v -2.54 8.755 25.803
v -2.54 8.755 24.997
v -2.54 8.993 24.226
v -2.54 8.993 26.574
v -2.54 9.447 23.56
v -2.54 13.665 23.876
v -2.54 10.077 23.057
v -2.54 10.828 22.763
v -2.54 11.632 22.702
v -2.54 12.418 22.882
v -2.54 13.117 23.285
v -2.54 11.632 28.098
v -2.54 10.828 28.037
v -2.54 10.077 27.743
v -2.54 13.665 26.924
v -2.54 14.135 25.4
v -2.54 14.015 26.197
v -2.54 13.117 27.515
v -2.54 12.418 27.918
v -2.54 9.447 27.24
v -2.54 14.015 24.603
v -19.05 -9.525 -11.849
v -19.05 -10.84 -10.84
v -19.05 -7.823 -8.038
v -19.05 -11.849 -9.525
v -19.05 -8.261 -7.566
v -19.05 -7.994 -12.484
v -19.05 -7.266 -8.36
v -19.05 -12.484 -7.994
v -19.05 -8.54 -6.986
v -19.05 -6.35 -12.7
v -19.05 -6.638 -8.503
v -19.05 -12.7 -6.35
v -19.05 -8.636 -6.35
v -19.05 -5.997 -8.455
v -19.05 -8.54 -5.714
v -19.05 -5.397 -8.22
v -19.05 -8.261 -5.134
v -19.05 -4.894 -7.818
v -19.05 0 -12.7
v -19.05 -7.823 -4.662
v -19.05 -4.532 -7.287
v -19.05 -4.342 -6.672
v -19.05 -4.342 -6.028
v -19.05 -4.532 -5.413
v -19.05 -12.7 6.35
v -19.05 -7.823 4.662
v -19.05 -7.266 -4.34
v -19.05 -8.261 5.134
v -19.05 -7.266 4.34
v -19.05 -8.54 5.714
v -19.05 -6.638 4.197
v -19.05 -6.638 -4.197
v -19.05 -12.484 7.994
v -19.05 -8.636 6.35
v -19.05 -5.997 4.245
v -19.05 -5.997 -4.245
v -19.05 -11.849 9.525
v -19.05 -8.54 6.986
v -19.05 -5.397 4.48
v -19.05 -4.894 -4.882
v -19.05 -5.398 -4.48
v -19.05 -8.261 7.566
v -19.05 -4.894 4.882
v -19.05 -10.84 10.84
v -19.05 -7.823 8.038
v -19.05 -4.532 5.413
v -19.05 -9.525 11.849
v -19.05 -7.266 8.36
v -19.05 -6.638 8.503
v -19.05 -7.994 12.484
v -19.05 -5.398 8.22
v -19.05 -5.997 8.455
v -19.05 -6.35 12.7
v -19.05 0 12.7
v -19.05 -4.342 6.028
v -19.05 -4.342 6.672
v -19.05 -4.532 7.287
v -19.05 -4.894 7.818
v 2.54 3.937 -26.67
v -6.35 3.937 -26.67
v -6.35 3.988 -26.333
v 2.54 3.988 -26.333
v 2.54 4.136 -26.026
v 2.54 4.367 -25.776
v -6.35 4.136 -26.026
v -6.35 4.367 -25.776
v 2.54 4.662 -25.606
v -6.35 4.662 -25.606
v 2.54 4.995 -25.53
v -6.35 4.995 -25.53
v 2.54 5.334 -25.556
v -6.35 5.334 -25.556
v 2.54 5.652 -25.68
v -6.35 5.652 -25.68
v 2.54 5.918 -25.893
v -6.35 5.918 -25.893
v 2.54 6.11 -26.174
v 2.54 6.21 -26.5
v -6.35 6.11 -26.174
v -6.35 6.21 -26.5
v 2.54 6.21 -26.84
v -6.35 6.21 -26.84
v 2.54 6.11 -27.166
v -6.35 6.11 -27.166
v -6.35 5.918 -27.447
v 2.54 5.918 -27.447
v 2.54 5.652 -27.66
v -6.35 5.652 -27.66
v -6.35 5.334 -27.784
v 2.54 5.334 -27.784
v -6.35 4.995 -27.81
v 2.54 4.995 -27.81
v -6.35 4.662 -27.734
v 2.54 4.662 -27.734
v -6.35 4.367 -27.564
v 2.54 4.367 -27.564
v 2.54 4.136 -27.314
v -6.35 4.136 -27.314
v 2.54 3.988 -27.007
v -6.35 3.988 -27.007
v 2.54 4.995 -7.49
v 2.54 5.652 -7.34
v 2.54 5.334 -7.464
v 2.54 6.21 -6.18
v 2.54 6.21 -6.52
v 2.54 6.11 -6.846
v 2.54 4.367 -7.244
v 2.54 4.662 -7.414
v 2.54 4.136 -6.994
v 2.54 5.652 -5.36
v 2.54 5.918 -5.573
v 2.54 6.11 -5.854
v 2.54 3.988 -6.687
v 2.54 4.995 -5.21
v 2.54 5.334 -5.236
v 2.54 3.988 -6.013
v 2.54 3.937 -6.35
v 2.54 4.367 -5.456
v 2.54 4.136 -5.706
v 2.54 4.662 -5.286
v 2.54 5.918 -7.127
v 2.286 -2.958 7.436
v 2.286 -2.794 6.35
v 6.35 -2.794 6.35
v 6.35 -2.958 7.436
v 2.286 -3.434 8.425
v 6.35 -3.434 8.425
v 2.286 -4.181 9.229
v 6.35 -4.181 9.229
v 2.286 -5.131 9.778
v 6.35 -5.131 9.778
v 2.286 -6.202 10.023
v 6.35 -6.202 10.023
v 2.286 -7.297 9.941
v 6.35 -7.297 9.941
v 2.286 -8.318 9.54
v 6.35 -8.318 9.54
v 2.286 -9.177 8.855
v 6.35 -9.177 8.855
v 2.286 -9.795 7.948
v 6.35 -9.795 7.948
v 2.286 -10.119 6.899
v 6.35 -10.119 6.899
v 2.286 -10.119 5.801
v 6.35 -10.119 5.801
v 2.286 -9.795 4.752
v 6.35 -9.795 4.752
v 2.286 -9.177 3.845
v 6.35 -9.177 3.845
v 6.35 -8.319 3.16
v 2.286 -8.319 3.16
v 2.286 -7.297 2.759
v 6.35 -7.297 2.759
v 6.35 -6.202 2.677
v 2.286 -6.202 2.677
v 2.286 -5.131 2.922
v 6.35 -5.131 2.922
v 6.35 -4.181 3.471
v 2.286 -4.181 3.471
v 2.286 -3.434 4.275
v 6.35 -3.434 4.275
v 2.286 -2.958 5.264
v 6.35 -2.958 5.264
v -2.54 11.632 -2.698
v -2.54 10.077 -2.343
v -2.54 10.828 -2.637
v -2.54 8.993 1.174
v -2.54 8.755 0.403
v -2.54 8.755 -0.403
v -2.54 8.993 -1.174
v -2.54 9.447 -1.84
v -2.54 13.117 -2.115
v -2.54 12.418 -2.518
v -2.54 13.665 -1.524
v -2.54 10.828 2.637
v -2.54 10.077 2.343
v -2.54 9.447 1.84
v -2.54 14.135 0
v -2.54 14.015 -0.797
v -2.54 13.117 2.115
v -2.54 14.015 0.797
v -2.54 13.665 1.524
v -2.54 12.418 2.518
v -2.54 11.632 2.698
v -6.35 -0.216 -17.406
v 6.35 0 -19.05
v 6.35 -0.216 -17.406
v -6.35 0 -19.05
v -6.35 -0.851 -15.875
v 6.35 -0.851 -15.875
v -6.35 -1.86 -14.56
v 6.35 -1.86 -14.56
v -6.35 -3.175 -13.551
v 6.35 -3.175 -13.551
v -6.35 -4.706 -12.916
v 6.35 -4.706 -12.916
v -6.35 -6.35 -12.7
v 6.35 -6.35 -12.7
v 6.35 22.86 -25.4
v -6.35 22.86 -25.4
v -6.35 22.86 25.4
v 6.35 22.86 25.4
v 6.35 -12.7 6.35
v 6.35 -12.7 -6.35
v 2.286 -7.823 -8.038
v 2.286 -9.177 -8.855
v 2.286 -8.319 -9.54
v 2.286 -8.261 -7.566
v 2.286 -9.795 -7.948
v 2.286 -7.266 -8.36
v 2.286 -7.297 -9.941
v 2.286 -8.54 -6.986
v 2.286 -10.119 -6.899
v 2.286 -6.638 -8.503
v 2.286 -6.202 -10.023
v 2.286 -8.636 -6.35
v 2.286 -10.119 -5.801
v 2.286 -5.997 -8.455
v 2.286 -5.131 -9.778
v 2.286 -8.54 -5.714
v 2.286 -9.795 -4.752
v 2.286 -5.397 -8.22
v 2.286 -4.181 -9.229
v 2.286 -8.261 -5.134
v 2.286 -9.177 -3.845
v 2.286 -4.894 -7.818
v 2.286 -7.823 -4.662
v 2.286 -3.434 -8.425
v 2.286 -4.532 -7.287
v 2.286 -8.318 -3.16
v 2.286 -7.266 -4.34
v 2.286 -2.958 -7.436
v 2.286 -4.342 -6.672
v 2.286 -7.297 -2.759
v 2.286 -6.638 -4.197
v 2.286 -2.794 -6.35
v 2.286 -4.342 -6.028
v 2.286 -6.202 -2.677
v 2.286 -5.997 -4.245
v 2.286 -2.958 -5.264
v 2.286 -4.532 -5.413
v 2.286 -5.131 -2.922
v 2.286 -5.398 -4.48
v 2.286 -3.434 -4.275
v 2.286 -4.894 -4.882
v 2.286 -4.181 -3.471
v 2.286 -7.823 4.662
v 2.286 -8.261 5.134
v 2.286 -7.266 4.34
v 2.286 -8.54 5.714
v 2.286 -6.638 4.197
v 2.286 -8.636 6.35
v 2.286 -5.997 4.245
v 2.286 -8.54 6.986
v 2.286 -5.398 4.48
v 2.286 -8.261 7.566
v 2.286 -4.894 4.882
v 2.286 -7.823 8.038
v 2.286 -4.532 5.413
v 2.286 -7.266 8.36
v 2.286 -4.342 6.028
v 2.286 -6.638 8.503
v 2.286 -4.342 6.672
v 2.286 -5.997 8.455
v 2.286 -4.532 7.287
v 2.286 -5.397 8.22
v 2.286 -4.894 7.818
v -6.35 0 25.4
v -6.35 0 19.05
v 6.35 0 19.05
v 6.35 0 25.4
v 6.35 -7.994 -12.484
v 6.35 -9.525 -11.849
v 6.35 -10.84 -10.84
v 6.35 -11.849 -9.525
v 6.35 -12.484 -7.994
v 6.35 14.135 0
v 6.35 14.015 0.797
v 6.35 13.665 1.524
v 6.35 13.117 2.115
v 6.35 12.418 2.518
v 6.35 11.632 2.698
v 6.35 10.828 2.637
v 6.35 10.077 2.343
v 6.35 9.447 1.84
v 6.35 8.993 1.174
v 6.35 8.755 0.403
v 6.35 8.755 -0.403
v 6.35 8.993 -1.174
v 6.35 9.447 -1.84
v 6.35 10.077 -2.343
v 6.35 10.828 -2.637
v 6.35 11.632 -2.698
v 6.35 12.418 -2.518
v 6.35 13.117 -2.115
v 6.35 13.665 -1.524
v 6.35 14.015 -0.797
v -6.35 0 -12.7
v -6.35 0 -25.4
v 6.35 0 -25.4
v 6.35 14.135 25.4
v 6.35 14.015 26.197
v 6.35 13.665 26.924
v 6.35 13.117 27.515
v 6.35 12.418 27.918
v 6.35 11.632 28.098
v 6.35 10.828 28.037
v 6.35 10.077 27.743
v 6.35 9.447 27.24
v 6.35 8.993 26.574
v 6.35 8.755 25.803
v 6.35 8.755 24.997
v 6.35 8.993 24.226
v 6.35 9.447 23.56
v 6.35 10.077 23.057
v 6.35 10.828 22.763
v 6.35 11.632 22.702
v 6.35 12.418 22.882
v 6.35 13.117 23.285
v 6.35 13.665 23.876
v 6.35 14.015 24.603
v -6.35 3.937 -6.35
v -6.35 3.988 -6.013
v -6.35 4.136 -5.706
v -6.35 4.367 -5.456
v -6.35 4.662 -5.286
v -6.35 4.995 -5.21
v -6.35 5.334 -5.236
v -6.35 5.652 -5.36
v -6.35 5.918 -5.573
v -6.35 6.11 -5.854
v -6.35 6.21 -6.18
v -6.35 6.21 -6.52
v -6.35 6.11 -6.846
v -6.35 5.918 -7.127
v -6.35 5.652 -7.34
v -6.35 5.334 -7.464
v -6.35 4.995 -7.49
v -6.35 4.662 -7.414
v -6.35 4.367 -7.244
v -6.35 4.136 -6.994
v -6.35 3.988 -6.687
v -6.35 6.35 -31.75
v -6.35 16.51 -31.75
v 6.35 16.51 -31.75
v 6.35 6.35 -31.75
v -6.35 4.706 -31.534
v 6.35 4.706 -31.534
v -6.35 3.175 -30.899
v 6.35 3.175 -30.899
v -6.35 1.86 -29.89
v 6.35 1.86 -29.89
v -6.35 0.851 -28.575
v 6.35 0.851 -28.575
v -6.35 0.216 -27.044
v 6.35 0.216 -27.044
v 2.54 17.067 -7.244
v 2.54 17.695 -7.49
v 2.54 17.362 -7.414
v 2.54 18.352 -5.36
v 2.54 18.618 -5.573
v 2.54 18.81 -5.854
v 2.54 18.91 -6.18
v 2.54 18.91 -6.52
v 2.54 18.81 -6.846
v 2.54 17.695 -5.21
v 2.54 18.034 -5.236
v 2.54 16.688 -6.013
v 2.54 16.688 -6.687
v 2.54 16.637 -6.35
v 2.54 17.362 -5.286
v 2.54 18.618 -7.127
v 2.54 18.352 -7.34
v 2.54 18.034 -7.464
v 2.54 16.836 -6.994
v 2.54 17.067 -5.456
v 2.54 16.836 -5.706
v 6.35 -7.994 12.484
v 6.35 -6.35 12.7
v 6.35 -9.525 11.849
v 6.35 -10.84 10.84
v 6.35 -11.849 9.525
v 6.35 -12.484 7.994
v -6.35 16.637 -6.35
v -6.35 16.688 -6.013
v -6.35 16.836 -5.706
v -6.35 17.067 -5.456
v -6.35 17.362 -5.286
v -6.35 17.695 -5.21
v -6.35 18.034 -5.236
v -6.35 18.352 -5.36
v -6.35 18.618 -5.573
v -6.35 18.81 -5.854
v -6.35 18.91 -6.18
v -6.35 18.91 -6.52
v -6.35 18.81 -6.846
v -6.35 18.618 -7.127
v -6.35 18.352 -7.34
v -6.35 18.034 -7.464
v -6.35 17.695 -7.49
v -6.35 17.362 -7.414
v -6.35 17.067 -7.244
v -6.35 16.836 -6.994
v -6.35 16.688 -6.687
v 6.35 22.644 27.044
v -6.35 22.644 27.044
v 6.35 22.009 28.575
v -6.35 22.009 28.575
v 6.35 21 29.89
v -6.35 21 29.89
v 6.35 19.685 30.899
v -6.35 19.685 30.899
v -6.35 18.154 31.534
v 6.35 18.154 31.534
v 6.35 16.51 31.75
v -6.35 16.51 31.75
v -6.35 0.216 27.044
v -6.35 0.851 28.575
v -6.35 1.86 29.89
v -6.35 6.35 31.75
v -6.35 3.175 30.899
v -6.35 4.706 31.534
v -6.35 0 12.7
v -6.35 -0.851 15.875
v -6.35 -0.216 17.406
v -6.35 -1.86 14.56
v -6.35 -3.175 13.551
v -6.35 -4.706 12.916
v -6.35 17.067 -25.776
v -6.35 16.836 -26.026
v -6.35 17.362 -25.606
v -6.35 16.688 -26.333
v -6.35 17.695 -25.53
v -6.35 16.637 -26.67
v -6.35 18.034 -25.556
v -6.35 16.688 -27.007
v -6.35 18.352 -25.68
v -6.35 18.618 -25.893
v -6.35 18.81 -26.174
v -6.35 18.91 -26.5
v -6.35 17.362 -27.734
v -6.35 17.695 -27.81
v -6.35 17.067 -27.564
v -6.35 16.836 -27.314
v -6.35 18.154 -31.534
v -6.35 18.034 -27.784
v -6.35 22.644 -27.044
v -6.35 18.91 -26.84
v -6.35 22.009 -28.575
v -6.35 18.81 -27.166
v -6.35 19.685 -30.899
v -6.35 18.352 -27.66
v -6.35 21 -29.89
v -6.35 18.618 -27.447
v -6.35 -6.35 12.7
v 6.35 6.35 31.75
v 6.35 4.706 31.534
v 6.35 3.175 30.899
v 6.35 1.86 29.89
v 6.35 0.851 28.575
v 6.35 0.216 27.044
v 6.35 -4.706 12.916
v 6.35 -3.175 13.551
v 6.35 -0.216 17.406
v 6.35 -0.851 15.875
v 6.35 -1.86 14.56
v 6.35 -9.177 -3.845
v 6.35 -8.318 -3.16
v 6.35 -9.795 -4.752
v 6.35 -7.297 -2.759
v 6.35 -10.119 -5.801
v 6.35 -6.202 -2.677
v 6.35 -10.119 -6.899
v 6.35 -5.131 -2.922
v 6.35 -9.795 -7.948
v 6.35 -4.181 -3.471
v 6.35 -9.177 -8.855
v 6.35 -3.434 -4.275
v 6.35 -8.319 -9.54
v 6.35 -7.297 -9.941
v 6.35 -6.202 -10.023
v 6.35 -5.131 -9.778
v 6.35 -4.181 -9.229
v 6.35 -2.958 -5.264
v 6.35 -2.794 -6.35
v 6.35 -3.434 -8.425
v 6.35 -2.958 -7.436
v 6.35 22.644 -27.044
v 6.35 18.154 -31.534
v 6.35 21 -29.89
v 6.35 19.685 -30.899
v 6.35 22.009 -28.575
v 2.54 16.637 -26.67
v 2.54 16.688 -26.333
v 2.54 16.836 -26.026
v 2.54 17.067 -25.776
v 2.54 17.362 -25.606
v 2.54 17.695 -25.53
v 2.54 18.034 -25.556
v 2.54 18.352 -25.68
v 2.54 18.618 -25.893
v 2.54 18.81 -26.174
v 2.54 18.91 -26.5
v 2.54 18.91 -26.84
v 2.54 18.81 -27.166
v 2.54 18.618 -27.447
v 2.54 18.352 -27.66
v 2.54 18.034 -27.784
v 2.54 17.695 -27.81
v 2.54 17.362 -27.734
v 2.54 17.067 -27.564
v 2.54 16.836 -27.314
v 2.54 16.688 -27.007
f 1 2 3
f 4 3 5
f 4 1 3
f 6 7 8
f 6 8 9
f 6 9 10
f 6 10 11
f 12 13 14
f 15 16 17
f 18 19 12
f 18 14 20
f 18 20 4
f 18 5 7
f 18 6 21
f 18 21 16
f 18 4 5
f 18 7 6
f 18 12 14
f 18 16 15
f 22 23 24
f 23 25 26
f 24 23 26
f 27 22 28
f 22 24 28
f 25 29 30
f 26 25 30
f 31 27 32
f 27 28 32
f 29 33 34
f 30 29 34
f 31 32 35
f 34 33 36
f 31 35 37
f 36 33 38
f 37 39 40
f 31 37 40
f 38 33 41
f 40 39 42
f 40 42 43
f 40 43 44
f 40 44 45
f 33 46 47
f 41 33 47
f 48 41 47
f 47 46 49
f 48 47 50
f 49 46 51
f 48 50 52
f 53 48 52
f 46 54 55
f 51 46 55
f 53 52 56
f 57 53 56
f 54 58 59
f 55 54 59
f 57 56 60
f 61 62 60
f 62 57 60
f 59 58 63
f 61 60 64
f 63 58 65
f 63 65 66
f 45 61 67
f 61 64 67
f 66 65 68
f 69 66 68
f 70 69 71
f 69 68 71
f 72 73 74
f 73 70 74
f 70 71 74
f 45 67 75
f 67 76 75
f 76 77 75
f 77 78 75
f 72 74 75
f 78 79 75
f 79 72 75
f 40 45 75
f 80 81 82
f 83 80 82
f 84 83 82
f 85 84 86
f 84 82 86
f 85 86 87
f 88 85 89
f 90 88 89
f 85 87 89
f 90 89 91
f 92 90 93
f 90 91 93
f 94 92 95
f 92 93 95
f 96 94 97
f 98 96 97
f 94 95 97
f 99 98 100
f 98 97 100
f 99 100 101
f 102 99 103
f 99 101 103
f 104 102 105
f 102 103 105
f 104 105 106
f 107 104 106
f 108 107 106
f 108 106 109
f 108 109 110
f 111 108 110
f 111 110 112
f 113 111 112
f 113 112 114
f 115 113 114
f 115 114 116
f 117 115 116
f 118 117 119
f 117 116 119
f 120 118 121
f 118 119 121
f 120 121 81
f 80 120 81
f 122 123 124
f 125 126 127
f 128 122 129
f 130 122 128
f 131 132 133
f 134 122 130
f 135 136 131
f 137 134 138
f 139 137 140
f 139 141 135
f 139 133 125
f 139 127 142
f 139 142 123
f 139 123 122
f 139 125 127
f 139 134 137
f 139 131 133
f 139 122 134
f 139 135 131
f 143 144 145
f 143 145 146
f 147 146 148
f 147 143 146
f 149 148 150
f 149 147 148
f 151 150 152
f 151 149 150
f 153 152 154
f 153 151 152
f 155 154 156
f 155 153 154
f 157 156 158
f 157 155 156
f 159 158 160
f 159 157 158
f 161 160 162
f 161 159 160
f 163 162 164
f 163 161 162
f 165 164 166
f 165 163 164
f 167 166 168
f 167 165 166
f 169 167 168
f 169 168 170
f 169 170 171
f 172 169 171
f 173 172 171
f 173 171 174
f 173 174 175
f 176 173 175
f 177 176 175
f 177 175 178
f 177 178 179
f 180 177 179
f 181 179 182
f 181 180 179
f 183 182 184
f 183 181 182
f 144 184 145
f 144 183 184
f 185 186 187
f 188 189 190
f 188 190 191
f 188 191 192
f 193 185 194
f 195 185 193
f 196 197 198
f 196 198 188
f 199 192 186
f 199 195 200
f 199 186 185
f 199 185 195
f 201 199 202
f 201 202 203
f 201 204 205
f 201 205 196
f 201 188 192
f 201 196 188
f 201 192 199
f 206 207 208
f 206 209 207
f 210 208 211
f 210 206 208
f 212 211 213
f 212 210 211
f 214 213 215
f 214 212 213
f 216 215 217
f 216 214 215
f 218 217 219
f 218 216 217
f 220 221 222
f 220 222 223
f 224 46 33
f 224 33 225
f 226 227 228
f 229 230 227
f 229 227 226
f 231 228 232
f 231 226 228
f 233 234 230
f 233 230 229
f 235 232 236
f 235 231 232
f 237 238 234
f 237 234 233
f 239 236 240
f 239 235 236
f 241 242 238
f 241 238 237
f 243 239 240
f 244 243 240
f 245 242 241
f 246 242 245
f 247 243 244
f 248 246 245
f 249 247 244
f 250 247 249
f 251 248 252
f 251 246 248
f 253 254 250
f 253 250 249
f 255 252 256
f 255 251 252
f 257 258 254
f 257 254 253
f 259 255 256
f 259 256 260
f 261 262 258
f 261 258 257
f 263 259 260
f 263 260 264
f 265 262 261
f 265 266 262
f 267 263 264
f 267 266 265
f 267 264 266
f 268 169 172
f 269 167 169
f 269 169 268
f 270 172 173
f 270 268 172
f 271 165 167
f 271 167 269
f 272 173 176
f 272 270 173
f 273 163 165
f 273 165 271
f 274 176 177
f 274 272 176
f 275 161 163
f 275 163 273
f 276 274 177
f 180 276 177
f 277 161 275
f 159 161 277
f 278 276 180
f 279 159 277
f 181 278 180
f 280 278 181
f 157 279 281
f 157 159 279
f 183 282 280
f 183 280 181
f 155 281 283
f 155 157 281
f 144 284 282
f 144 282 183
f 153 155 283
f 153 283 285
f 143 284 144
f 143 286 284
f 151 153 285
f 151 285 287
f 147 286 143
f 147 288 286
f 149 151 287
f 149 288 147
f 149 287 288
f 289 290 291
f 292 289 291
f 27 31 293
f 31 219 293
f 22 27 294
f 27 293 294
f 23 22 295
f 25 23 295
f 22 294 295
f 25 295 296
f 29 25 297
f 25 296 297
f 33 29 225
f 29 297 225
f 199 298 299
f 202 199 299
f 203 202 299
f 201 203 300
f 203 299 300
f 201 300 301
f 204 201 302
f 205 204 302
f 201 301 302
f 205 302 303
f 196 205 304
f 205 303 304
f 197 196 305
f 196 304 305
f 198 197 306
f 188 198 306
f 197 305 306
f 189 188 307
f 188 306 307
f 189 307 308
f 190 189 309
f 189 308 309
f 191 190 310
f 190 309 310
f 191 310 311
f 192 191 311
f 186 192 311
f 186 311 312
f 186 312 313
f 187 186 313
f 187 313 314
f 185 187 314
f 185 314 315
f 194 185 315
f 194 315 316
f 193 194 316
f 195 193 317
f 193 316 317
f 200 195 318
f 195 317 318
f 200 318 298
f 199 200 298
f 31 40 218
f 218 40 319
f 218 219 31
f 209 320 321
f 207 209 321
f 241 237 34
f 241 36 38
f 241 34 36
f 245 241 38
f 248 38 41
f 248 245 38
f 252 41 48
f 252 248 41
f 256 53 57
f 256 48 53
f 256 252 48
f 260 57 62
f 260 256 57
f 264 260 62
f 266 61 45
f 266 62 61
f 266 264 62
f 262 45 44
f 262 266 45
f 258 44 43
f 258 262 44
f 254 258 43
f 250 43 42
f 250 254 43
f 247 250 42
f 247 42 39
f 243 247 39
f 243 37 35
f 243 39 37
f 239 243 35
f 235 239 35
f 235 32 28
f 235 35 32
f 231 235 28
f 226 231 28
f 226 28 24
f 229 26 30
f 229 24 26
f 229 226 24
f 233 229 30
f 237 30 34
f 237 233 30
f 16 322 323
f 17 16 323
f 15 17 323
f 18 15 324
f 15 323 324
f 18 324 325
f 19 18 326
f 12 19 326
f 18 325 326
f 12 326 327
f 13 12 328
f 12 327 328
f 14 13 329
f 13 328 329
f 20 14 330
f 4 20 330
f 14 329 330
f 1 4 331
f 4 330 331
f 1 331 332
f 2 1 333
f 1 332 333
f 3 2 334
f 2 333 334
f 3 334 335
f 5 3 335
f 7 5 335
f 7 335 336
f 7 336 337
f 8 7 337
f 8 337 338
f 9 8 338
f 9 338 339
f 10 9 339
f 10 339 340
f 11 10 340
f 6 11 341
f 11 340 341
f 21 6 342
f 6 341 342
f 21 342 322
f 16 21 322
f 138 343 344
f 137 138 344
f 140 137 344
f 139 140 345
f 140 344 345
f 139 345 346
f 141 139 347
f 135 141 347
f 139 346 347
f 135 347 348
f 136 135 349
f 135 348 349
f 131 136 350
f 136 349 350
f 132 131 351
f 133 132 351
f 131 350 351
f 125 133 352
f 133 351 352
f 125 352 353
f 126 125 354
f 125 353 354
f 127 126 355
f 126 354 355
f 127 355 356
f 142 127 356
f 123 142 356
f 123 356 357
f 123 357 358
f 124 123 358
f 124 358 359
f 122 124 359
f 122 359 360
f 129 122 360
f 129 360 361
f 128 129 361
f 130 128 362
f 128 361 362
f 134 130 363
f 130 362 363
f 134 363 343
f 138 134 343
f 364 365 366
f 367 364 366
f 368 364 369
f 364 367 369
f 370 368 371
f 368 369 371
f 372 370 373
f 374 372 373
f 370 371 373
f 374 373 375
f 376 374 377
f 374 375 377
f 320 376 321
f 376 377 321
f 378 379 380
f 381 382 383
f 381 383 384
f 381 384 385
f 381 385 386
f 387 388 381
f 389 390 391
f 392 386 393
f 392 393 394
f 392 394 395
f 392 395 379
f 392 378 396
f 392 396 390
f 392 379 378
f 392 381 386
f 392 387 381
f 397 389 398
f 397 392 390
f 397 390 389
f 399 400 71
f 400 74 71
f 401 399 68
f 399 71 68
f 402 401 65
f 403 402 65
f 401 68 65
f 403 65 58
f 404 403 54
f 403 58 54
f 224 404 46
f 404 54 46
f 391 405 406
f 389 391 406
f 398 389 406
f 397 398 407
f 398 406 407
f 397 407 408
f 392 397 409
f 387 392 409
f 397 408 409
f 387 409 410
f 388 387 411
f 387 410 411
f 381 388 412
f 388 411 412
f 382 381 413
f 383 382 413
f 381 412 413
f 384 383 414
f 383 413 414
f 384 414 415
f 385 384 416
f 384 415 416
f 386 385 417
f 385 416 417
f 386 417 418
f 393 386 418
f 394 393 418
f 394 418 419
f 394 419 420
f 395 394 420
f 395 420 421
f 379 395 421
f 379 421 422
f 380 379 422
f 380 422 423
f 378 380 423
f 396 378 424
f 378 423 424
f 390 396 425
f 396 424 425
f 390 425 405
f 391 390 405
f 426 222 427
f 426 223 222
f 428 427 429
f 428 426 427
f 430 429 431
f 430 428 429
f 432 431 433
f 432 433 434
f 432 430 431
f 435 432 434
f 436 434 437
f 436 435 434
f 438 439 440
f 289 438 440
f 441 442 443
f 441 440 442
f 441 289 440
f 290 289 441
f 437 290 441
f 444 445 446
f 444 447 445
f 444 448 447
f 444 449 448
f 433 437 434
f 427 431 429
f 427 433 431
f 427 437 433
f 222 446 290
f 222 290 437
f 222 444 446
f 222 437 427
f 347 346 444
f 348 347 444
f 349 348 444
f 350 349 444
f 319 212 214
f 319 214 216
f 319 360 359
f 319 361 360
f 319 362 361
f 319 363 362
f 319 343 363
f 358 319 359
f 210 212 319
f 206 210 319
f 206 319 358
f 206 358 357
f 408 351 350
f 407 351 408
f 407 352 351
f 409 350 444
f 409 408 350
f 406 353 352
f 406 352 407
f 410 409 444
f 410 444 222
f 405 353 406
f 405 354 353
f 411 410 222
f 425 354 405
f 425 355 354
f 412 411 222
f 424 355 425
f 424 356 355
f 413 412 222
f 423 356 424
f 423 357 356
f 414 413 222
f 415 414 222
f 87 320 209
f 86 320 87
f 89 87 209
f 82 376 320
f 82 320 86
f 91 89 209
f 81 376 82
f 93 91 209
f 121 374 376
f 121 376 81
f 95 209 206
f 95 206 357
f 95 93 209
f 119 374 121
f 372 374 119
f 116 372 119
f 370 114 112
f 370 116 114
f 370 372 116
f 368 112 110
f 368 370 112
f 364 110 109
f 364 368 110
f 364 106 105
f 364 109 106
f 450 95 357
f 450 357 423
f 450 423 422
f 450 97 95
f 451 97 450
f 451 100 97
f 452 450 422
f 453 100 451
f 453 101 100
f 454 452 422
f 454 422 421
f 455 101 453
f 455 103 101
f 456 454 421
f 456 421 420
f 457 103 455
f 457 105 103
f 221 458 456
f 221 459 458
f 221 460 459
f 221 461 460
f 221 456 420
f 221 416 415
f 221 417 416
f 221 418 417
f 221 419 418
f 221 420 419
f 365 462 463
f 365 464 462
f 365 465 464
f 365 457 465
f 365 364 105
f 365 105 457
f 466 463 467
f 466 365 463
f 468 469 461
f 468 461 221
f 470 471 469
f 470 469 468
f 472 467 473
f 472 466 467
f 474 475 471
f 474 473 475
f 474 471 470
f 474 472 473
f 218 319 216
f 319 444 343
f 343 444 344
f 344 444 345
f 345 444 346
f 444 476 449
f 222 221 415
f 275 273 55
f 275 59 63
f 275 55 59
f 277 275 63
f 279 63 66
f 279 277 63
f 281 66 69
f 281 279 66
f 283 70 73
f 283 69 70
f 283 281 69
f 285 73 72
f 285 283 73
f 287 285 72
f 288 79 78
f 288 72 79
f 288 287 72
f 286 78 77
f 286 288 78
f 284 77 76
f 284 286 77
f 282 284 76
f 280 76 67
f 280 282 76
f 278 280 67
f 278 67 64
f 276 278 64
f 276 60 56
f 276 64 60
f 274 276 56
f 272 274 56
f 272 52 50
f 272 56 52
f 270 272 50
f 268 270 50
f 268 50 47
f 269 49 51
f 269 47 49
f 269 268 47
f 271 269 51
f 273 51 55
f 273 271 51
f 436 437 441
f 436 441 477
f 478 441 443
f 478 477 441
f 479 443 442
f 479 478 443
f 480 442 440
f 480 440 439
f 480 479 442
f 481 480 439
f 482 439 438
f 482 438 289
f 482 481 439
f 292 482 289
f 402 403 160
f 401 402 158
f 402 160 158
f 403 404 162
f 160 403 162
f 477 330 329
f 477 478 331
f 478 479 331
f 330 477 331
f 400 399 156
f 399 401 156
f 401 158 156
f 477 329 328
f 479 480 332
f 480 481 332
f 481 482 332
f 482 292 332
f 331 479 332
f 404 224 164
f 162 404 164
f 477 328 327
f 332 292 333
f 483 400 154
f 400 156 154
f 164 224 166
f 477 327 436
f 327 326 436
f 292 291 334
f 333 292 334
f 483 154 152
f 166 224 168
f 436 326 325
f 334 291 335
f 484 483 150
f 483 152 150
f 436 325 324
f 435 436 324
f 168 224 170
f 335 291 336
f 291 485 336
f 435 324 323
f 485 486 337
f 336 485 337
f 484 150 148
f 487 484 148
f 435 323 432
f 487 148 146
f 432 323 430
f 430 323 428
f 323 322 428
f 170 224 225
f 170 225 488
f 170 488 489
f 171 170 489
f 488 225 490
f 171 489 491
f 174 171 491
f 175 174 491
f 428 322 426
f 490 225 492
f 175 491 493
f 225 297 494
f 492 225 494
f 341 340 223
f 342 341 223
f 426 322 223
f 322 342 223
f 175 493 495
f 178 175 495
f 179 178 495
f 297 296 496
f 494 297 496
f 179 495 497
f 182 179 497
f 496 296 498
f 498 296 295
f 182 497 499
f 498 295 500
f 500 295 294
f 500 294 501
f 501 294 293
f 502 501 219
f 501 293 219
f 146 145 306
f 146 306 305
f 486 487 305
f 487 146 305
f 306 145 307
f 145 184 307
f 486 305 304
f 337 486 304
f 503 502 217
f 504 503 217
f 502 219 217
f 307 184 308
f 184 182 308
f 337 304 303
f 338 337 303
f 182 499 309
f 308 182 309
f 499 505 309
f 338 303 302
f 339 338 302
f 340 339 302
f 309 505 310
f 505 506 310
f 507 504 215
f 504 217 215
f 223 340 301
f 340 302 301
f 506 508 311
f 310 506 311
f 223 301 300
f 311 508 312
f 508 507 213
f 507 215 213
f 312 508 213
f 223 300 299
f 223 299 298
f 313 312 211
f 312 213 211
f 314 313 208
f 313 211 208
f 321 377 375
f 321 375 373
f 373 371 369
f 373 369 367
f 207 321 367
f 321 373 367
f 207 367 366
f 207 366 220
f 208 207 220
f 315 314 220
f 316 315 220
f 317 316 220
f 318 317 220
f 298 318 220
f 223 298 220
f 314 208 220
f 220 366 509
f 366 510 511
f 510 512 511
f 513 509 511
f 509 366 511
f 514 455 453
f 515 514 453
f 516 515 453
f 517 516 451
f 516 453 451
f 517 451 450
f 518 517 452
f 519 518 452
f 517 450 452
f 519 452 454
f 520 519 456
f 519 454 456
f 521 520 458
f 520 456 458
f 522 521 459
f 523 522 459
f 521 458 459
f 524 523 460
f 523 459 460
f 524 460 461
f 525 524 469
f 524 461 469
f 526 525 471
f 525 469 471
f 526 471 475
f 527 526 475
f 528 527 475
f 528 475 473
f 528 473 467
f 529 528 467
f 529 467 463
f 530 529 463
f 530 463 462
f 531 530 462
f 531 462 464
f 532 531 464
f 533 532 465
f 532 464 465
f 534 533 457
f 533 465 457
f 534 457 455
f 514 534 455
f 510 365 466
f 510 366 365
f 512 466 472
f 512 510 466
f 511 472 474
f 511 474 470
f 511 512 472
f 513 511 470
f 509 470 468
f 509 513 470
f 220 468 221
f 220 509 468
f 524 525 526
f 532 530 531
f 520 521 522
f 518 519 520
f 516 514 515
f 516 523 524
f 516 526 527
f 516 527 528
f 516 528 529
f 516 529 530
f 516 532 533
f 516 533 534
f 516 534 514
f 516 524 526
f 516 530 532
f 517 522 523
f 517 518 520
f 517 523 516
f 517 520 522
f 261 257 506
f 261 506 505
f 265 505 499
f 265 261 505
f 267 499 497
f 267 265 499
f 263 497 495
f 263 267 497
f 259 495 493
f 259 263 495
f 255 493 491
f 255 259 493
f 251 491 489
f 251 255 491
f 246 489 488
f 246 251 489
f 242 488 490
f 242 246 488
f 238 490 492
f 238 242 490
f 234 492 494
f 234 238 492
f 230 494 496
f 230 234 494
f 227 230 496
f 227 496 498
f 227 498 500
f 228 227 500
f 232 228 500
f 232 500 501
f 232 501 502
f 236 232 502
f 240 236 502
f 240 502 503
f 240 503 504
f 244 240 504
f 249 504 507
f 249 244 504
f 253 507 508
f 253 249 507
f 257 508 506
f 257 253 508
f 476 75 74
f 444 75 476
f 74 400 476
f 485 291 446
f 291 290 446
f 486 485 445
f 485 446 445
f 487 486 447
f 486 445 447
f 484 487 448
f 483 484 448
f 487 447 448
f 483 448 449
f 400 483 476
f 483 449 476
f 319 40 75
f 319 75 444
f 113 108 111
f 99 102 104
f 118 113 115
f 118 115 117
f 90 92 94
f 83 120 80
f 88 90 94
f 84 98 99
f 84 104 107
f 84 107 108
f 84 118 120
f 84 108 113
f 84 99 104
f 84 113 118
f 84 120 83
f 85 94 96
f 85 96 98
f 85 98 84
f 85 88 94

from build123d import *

# Parameters (mm, degrees)
PROFILE_W                = 12.7
PROFILE_H                = 22.86
PROFILE_W_2              = 6.35
PROFILE_H_2              = 12.7
BOSS_EXTRUDE1_DEPTH      = 12.7
SKETCH7_W                = 19.05
SKETCH7_H                = 12.7
BOSS_EXTRUDE2_DEPTH      = 25.4
CUT_EXTRUDE1_DEPTH       = 37.45585824
CUT_EXTRUDE1_DEPTH_BACK  = 37.45585824
SCREWHOLE_R              = 2.159
CUT_EXTRUDE2_START       = -4.064
SKETCH3_R                = 3.683
SKETCH3_R_2              = 2.159
CUT_EXTRUDE2_DEPTH       = 4.064
BOSS_EXTRUDE4_DEPTH      = 31.75
BOSS_EXTRUDE4_DEPTH_BACK = 31.75
SKETCH11_W               = 12.7
SKETCH11_H               = 22.86
SKETCH14_R               = 2.7051
CUT_EXTRUDE3_DEPTH       = 8.89
SKETCH13_R               = 1.143
CUT_EXTRUDE4_DEPTH       = 8.89
FILLET1_R                = 6.35


with BuildPart() as part:
    # Profile → Boss-Extrude1 (new, symmetric)
    with BuildSketch(Plane.XY):
        with Locations((0, 11.43)):
            Rectangle(PROFILE_W, PROFILE_H)
        with Locations((3.175, -6.35)):
            Rectangle(PROFILE_W_2, PROFILE_H_2)
    extrude(amount=BOSS_EXTRUDE1_DEPTH, both=True)

    # Sketch7 → Boss-Extrude2 (add)
    with BuildSketch(Plane.XY.offset(12.7)):
        with Locations((-9.525, -6.35)):
            Rectangle(SKETCH7_W, SKETCH7_H)
    extrude(amount=-BOSS_EXTRUDE2_DEPTH)

    # ScrewHole → Cut-Extrude1 (cut, two sides: drawn at the far end of the back side and taken through both)
    with BuildSketch(Plane.ZY.offset(19.05).offset(-CUT_EXTRUDE1_DEPTH_BACK)):
        with Locations(Location((6.35, -6.477, 0), (0, 0, 270))):
            Circle(SCREWHOLE_R)
        with Locations(Location((-6.35, -6.477, 0), (0, 0, 270))):
            Circle(SCREWHOLE_R)
    extrude(amount=CUT_EXTRUDE1_DEPTH + CUT_EXTRUDE1_DEPTH_BACK, mode=Mode.SUBTRACT)

    # Sketch3 → Cut-Extrude2 (cut)
    # profile 1 of 2: a face of its own
    with BuildSketch(Plane(origin=(6.35, 0, 0), x_dir=(0, 0, -1), z_dir=(1, 0, 0)).offset(CUT_EXTRUDE2_START)):
        with Locations(Location((-6.35, -6.477, 0), (0, 0, 90))):
            Circle(SKETCH3_R)
        with Locations(Location((-6.35, -6.477, 0), (0, 0, 270))):
            Circle(SKETCH3_R_2, mode=Mode.SUBTRACT)
    # profile 2 of 2: a face of its own
    with BuildSketch(Plane(origin=(6.35, 0, 0), x_dir=(0, 0, -1), z_dir=(1, 0, 0)).offset(CUT_EXTRUDE2_START)):
        with Locations(Location((6.35, -6.477, 0), (0, 0, 90))):
            Circle(SKETCH3_R)
    extrude(amount=CUT_EXTRUDE2_DEPTH, mode=Mode.SUBTRACT)

    # Sketch11 → Boss-Extrude4 (add, two sides: drawn at the far end of the back side and taken through both)
    with BuildSketch(Plane.XY.offset(-BOSS_EXTRUDE4_DEPTH_BACK)):
        with Locations((0, 11.43)):
            Rectangle(SKETCH11_W, SKETCH11_H)
    extrude(amount=BOSS_EXTRUDE4_DEPTH + BOSS_EXTRUDE4_DEPTH_BACK)

    # Sketch14 → Cut-Extrude3 (cut)
    with BuildSketch(Plane(origin=(6.35, 0, 0), x_dir=(0, 0, -1), z_dir=(1, 0, 0))):
        with Locations(Location((-25.4, 11.43, 0), (0, 0, 90))):
            Circle(SKETCH14_R)
        with Locations(Location((0, 11.43, 0), (0, 0, 90))):
            Circle(SKETCH14_R)
    extrude(amount=-CUT_EXTRUDE3_DEPTH, mode=Mode.SUBTRACT)

    # Sketch13 → Cut-Extrude4 (cut)
    with BuildSketch(Plane.ZY.offset(6.35)):
        with Locations(Location((-26.67, 17.78, 0), (0, 0, 270))):
            Circle(SKETCH13_R)
        with Locations(Location((-6.35, 17.78, 0), (0, 0, 270))):
            Circle(SKETCH13_R)
        with Locations(Location((-6.35, 5.08, 0), (0, 0, 270))):
            Circle(SKETCH13_R)
        with Locations(Location((-26.67, 5.08, 0), (0, 0, 270))):
            Circle(SKETCH13_R)
    extrude(amount=-CUT_EXTRUDE4_DEPTH, mode=Mode.SUBTRACT)

    # Fillet1
    fillet1_edges = [part.edges().sort_by_distance(p)[0] for p in [
        (-6.35, -12.7, -12.7),
        (-6.35, -12.7, 12.7),
        (0, 0, 31.75),
        (0, 22.86, 31.75),
        (0, 22.86, -31.75),
        (0, 0, -31.75),
        (0, 0, -12.7),
        (0, 0, 12.7),
    ]]
    fillet(fillet1_edges, radius=FILLET1_R - 0.0001)  # a hair under: the kernel refuses the full size


solid = part.part
